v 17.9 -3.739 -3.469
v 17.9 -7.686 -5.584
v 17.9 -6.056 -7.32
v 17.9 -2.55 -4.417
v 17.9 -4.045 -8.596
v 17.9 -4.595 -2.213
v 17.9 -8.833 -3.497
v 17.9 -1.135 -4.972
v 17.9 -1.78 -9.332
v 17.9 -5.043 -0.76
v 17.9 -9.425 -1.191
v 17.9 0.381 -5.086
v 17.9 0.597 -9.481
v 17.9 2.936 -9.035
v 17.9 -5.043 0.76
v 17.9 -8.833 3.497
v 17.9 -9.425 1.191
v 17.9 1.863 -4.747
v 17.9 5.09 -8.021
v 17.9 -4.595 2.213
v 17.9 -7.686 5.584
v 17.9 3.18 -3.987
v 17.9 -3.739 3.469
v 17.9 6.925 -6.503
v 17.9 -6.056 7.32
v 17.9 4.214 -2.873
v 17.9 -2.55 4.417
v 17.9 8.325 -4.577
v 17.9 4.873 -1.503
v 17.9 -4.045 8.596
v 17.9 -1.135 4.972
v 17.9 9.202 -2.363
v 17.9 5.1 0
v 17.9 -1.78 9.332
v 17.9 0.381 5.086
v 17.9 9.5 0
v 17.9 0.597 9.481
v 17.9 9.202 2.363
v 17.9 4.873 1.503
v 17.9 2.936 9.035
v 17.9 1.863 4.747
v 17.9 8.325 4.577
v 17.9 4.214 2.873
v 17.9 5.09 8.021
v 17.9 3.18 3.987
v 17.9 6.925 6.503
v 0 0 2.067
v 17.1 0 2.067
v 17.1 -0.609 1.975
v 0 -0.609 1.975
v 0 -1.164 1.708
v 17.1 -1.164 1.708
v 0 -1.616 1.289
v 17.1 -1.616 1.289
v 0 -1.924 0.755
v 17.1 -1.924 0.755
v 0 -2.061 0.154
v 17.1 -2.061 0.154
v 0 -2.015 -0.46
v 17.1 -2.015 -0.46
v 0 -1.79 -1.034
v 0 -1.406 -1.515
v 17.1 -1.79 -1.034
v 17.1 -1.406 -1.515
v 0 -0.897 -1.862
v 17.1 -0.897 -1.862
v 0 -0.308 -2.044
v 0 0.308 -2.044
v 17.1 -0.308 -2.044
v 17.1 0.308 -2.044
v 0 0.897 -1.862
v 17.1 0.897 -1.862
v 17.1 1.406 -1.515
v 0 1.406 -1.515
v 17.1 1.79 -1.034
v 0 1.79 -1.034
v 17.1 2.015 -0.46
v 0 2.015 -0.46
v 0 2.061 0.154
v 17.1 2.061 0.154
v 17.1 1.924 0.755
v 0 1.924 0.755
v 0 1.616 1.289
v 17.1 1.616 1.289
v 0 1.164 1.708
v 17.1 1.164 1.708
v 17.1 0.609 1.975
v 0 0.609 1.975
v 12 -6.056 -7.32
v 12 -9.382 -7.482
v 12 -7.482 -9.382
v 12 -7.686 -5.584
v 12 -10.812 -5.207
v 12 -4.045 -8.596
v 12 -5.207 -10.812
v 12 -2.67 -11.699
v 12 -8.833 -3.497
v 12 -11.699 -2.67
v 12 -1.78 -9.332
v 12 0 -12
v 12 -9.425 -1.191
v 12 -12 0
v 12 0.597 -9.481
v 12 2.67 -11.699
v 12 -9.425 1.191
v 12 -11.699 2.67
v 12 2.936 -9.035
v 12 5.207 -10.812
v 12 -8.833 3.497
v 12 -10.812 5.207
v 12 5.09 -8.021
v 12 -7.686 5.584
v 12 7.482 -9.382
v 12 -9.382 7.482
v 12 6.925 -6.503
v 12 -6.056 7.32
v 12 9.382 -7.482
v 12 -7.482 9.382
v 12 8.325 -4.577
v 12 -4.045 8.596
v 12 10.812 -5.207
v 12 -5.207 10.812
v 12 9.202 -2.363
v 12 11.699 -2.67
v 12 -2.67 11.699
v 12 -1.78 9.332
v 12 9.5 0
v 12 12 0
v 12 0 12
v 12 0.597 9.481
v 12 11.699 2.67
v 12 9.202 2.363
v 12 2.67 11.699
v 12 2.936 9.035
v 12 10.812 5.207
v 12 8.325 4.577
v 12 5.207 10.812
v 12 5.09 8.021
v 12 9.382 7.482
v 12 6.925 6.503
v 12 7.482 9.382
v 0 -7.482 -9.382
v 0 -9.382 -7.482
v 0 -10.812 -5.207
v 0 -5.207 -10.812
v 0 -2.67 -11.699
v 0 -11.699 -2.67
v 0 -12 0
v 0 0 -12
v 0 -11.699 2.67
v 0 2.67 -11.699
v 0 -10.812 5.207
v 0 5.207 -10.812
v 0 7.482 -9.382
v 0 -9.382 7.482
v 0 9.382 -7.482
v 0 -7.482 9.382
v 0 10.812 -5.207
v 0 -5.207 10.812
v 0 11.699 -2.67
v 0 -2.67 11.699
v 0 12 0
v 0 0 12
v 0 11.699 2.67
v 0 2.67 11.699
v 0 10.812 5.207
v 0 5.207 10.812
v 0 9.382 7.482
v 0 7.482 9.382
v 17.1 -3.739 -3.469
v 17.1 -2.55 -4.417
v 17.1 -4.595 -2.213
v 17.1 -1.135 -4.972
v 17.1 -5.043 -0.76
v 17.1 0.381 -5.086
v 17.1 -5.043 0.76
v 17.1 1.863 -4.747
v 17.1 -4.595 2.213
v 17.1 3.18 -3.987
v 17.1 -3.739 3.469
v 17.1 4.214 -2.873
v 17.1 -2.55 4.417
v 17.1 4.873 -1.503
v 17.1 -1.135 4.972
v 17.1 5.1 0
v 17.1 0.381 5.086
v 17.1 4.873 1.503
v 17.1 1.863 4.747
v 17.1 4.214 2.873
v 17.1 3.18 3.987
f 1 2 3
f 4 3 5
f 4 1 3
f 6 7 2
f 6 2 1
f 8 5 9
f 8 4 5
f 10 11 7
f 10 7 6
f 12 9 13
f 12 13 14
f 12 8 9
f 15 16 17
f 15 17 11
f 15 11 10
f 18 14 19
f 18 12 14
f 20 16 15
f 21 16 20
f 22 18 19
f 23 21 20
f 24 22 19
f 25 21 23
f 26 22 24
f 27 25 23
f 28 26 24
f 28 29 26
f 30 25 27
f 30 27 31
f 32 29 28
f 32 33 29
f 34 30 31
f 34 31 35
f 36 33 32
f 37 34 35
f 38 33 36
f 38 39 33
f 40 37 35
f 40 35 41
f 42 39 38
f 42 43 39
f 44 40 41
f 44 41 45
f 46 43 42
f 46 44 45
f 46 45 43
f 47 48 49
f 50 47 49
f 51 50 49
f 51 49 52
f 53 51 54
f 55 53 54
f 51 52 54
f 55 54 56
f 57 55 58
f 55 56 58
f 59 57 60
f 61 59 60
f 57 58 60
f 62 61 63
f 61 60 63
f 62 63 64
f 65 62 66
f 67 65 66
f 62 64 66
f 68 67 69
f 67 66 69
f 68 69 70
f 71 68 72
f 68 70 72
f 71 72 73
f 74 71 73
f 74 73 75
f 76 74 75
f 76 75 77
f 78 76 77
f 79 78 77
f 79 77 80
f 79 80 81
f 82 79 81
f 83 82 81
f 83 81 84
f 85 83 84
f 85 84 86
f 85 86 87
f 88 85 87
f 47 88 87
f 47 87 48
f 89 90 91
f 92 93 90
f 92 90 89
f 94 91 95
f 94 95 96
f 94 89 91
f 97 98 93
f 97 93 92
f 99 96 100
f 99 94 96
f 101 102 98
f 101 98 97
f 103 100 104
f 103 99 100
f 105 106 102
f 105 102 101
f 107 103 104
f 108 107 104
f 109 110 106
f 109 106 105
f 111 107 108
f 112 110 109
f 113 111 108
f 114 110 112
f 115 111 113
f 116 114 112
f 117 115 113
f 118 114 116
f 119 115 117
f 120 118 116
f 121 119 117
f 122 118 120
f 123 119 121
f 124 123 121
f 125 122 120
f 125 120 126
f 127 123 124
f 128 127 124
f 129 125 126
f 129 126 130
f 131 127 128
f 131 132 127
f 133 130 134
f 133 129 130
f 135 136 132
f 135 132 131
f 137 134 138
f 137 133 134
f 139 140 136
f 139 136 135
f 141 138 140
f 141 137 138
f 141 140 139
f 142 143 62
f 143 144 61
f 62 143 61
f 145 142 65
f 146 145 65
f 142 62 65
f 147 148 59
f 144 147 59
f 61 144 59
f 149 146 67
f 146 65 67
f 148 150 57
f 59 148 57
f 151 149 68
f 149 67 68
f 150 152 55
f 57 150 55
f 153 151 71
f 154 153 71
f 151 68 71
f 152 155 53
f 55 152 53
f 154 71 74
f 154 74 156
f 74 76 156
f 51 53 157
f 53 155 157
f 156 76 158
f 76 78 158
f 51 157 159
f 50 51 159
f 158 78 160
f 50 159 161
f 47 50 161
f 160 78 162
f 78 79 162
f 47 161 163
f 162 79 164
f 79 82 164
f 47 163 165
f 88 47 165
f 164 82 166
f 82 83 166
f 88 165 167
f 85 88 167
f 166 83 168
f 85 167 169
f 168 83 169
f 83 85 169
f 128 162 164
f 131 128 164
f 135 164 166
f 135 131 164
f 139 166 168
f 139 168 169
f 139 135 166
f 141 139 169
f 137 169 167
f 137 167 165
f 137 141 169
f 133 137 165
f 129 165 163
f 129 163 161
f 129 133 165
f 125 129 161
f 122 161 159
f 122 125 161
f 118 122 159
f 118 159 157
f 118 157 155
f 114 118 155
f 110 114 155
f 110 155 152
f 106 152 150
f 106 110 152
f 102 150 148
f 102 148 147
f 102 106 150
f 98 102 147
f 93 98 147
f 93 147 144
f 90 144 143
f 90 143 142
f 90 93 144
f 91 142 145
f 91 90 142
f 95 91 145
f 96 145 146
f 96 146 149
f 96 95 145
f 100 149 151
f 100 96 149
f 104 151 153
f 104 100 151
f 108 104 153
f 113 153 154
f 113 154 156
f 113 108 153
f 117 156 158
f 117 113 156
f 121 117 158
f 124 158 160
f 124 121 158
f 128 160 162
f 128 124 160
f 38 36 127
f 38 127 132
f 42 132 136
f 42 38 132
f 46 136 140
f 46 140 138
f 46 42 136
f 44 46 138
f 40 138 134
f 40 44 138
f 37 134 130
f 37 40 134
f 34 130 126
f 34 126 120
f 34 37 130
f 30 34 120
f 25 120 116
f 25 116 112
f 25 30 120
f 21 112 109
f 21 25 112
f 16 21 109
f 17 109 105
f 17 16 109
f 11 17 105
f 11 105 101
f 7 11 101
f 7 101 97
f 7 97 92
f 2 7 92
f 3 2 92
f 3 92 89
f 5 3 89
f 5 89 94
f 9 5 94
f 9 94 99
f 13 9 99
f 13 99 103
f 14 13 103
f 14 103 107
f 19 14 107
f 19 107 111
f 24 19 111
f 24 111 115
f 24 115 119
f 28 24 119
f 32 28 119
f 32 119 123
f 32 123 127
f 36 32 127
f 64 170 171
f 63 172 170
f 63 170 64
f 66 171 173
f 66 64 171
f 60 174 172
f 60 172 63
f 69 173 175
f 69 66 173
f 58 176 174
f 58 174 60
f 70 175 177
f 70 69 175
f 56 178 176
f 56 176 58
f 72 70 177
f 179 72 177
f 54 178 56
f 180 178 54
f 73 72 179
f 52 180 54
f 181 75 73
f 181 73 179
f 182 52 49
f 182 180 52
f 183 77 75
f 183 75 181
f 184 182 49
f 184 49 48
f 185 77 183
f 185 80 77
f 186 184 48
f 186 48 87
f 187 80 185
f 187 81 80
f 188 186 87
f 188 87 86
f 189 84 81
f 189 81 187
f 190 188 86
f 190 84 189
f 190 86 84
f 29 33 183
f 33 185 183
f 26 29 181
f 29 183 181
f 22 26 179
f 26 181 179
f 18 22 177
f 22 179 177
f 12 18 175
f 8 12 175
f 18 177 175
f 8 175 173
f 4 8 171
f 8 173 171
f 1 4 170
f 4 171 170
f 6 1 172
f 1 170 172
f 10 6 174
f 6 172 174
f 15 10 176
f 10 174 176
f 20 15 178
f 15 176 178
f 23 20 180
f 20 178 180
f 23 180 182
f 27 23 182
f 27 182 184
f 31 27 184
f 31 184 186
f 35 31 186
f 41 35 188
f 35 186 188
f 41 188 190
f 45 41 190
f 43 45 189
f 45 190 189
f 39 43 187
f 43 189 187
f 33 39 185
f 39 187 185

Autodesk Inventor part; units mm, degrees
ref_plane "YZ Plane" through (0, 0, 0) normal (1, 0, 0) x (0, 1, 0)
ref_plane "XZ Plane" through (0, 0, 0) normal (0, 1, 0) x (-1, 0, 0)
ref_plane "XY Plane" through (0, 0, 0) normal (0, 0, 1) x (1, 0, 0)
sketch "Skizze1" plane through (0, 0, 0) normal (0, 0, 1) x (1, 0, 0)
  line L0 (0, 0) -> (0, 12)
  line L1 (0, 12) -> (12, 12)
  line L2 (12, 12) -> (12, 9.5)
  line L3 (12, 9.5) -> (17.9, 9.5)
  line L4 (17.9, 9.5) -> (17.9, 5)
  line L5 (0, 0) -> (17.1, 0)
  line L6 (17.9, 5) -> (17.1, 5)
  line L7 (17.1, 5) -> (17.1, 0)
  dimension "d0" = 19
  dimension "d1" = 24
  dimension "d2" = 5.9
  dimension "d3" = 12
  dimension "d12" = 10
  dimension "d13" = 5.1
revolve "Umdrehung1" add sketch "Skizze1" angle 360 about axis through (0, 0, 0) along (1, 0, 0)
sketch "Skizze2" plane through (0, 0, 0) normal (-1, 0, 0) x (0, 0, 1)
  point P0 (0, 0)
  point P1 (0, 0)
hole "Bohrung1" at (0, 0, 0) direction (1, 0, 0) diameter 4.134 end through all thread size "M5x0.8" class "6H" standard "ISO Metric profile"
feature "Verdickung1" [suppressed]
thicken "Verdickung2" operation add thickness 0.1 both sides no extend neighbours yes toward (0, 0.9870503, -0.1604113) faces at (17.3667, 4.9353, -0.8021)
properties part number "SpringCompensation_Outside_DrivenPart"
